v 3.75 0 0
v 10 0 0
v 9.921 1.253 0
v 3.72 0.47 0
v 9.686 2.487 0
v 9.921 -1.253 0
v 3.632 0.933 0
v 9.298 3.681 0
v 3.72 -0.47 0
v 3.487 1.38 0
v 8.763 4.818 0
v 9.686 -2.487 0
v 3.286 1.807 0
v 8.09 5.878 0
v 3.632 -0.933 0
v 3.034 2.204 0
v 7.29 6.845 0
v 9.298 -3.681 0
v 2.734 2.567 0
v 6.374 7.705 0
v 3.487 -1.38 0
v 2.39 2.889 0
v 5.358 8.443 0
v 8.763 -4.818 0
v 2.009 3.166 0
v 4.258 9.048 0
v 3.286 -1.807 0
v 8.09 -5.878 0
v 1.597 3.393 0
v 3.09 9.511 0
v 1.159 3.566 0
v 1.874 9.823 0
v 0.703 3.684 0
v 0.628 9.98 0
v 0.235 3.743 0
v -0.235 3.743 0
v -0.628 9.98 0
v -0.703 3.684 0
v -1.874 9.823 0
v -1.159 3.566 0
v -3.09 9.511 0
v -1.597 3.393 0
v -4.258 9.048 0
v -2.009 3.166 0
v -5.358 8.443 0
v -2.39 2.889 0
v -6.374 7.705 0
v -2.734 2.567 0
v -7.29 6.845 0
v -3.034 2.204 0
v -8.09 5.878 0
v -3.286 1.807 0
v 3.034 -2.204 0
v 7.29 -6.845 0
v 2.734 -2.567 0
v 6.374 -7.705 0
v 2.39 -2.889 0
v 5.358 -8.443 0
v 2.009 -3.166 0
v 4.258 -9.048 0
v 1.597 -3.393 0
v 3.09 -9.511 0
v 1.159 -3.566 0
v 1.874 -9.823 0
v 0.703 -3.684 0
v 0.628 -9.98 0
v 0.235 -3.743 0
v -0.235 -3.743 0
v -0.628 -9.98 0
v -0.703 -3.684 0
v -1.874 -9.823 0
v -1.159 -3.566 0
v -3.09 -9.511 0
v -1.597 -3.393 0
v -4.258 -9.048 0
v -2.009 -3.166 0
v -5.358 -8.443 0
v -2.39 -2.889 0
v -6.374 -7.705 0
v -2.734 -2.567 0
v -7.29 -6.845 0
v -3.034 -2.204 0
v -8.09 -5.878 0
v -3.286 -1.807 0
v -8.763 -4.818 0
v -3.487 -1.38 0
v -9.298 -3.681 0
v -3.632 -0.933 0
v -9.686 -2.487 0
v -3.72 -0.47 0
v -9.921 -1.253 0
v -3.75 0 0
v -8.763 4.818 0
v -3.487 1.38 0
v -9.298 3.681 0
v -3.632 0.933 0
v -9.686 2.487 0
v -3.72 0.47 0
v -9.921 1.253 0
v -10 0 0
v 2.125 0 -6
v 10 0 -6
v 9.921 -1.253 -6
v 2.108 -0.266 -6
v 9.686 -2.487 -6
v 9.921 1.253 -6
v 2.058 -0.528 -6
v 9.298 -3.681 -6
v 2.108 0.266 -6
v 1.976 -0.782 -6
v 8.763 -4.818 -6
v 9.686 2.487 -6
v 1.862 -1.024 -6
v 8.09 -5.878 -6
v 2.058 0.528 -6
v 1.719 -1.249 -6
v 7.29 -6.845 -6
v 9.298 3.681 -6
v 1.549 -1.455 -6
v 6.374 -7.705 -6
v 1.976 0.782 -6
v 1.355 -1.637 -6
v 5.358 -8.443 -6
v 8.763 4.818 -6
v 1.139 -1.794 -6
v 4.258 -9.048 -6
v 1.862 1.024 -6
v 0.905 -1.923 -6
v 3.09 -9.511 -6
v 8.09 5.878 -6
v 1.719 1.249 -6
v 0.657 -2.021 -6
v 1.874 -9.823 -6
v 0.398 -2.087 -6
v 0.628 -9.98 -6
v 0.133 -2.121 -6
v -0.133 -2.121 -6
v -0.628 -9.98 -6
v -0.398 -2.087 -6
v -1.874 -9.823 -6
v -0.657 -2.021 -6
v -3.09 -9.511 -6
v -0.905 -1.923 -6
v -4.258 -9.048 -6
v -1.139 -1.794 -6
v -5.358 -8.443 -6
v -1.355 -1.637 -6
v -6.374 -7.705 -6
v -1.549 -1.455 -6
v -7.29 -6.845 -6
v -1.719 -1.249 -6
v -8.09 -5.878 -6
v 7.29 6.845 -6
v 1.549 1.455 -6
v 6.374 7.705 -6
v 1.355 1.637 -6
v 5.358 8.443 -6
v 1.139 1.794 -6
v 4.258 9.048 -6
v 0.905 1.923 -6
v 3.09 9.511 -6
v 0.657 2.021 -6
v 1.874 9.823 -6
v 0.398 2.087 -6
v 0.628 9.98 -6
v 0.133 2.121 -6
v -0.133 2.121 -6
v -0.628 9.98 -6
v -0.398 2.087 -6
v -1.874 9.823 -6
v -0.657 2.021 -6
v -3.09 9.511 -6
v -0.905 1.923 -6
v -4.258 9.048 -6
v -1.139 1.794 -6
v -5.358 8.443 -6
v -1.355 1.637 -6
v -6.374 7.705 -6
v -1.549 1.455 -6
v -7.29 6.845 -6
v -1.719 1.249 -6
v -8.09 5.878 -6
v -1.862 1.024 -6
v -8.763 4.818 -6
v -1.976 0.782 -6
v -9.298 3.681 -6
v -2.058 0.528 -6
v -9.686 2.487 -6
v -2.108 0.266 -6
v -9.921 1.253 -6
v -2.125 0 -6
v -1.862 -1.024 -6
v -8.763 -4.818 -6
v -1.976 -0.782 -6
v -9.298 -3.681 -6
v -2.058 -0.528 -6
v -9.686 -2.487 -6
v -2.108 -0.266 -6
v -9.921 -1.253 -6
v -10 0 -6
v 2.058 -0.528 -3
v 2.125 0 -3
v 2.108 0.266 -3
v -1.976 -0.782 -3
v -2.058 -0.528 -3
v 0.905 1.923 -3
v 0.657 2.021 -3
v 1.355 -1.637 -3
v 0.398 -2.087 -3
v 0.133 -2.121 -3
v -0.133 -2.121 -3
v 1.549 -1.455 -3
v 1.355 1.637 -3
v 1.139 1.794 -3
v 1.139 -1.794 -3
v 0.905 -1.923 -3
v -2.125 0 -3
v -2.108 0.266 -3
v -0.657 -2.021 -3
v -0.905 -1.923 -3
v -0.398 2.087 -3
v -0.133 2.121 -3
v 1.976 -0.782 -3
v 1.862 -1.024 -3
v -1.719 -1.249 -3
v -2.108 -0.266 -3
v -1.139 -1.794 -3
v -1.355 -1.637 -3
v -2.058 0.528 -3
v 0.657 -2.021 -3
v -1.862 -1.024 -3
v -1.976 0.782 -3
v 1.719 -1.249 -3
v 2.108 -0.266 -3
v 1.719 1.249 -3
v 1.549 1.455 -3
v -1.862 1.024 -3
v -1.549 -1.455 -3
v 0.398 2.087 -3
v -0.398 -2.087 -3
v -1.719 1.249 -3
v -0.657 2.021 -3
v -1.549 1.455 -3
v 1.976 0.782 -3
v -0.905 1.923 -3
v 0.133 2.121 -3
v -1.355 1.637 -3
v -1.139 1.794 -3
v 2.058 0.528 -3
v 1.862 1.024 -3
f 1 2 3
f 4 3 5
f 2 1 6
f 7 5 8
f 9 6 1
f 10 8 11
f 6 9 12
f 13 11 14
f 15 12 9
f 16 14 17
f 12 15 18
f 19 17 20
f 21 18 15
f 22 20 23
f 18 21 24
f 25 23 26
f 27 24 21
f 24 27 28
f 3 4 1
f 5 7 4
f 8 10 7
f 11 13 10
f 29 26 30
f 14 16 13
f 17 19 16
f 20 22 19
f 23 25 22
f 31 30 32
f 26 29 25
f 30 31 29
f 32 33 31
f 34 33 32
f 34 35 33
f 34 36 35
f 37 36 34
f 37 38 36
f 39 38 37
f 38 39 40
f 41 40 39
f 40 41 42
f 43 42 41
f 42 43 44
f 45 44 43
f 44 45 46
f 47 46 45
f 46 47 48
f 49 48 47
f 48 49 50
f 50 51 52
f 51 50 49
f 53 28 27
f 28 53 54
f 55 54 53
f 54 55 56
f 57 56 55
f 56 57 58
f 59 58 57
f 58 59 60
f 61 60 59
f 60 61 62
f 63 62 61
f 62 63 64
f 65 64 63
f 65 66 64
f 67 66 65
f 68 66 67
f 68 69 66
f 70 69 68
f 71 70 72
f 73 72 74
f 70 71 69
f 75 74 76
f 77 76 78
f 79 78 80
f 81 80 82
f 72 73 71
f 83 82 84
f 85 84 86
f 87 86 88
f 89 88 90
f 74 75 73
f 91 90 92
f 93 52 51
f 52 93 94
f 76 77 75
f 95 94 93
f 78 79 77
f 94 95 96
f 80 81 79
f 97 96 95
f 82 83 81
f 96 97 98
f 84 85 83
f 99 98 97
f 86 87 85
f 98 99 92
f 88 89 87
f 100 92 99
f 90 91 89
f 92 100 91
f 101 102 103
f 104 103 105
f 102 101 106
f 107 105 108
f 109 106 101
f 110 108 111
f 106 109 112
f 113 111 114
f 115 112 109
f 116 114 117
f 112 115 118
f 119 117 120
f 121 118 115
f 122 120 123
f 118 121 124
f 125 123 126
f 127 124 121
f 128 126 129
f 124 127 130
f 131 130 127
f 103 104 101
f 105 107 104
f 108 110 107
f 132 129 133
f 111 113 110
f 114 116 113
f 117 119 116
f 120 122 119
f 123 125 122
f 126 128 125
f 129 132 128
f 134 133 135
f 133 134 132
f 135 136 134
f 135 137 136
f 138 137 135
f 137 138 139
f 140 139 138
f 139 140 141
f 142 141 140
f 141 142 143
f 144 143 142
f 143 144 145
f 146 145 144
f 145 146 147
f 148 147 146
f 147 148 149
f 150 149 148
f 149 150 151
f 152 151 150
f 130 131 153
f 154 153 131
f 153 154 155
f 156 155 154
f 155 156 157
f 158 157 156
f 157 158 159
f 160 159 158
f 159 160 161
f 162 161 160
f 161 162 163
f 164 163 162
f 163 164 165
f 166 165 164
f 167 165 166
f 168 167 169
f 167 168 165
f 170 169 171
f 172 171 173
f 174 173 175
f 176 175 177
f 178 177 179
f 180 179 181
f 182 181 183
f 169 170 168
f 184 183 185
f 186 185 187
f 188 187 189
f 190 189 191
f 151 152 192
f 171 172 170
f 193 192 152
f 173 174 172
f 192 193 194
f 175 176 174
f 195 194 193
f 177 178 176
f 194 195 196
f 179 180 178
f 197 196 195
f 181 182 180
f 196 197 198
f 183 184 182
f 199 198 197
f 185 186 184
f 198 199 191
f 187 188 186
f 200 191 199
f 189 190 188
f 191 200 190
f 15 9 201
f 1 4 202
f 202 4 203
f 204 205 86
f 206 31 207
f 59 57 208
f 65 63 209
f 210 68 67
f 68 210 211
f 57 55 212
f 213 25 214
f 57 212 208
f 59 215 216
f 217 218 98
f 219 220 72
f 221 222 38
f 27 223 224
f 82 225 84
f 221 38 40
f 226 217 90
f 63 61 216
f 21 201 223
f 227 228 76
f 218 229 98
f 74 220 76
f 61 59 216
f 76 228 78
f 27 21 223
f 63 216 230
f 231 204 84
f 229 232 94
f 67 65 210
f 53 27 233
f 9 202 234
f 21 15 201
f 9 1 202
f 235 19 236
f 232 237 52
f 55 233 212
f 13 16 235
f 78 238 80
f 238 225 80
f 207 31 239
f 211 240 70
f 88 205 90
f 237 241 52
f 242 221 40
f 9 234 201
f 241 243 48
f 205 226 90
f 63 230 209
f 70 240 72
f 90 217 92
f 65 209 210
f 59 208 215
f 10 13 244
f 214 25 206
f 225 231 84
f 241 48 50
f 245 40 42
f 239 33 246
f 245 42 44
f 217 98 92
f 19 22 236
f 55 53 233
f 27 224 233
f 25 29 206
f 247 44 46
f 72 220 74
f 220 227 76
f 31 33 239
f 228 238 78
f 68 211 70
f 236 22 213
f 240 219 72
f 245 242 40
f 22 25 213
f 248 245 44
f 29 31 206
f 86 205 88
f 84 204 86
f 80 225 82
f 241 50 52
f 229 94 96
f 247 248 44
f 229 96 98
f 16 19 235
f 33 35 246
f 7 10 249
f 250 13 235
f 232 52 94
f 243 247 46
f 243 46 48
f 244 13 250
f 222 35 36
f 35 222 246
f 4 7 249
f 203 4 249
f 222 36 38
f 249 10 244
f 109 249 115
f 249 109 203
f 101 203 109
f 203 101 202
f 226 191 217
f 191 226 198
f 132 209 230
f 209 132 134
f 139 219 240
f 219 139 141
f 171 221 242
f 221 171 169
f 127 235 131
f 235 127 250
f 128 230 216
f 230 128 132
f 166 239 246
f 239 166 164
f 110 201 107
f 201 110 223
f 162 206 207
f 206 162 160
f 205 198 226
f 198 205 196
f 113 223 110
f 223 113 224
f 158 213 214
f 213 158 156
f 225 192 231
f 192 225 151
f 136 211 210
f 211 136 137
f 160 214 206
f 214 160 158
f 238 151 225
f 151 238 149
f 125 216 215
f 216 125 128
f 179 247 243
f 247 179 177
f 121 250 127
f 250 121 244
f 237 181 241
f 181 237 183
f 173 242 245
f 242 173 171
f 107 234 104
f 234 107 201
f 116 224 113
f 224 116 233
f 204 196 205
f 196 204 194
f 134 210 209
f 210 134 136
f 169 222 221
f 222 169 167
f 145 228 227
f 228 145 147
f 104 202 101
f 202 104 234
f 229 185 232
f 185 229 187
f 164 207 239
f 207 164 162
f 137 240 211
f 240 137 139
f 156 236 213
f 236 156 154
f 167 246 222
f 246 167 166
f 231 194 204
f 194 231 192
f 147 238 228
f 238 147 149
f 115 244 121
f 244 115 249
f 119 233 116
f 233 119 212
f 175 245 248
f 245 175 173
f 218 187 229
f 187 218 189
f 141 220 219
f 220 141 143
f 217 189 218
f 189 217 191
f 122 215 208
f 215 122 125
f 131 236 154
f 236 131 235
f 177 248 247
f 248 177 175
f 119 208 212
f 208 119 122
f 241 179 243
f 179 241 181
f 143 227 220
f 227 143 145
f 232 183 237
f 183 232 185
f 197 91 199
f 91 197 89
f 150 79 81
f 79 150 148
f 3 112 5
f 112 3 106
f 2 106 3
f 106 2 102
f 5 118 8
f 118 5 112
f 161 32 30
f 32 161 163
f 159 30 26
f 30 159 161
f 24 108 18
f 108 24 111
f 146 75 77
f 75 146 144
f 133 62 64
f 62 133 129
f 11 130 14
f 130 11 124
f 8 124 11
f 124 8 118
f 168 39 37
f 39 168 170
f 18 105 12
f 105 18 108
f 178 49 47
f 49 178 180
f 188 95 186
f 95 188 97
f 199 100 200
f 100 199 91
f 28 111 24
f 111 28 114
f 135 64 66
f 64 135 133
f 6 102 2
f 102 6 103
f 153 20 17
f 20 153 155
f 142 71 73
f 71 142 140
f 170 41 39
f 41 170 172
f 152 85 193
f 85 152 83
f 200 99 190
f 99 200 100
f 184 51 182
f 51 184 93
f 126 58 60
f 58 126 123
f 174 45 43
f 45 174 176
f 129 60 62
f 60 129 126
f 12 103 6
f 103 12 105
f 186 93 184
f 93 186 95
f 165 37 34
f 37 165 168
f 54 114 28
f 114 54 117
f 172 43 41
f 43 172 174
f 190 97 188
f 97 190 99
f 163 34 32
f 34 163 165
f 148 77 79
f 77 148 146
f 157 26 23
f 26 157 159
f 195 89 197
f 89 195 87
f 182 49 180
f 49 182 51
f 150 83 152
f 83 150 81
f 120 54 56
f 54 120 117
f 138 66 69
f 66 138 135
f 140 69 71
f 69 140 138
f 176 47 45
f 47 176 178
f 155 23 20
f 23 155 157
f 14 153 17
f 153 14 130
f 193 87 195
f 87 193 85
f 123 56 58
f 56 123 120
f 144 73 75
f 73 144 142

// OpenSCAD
$fn = 50;


difference() {
	union() {
		translate(v = [0, 0, -6.0000000000]) {
			cylinder(h = 6, r = 10.0000000000);
		}
		cylinder(h = 0, r = 20.0000000000);
	}
	union() {
		translate(v = [0, 0, 0]) {
			rotate(a = [0, 0, 0]) {
				difference() {
					union() {
						#translate(v = [0, 0, -6.0000000000]) {
							cylinder(h = 6, r = 2.0000000000);
						}
						#translate(v = [0, 0, -3]) {
							cylinder(h = 3, r = 10.0000000000, r1 = 2.1250000000, r2 = 3.7500000000);
						}
						#translate(v = [0, 0, -6.0000000000]) {
							cylinder(h = 6, r = 2.1250000000);
						}
						#translate(v = [0, 0, -6.0000000000]) {
							cylinder(h = 6, r = 2.0000000000);
						}
					}
					union();
				}
			}
		}
	}
}
